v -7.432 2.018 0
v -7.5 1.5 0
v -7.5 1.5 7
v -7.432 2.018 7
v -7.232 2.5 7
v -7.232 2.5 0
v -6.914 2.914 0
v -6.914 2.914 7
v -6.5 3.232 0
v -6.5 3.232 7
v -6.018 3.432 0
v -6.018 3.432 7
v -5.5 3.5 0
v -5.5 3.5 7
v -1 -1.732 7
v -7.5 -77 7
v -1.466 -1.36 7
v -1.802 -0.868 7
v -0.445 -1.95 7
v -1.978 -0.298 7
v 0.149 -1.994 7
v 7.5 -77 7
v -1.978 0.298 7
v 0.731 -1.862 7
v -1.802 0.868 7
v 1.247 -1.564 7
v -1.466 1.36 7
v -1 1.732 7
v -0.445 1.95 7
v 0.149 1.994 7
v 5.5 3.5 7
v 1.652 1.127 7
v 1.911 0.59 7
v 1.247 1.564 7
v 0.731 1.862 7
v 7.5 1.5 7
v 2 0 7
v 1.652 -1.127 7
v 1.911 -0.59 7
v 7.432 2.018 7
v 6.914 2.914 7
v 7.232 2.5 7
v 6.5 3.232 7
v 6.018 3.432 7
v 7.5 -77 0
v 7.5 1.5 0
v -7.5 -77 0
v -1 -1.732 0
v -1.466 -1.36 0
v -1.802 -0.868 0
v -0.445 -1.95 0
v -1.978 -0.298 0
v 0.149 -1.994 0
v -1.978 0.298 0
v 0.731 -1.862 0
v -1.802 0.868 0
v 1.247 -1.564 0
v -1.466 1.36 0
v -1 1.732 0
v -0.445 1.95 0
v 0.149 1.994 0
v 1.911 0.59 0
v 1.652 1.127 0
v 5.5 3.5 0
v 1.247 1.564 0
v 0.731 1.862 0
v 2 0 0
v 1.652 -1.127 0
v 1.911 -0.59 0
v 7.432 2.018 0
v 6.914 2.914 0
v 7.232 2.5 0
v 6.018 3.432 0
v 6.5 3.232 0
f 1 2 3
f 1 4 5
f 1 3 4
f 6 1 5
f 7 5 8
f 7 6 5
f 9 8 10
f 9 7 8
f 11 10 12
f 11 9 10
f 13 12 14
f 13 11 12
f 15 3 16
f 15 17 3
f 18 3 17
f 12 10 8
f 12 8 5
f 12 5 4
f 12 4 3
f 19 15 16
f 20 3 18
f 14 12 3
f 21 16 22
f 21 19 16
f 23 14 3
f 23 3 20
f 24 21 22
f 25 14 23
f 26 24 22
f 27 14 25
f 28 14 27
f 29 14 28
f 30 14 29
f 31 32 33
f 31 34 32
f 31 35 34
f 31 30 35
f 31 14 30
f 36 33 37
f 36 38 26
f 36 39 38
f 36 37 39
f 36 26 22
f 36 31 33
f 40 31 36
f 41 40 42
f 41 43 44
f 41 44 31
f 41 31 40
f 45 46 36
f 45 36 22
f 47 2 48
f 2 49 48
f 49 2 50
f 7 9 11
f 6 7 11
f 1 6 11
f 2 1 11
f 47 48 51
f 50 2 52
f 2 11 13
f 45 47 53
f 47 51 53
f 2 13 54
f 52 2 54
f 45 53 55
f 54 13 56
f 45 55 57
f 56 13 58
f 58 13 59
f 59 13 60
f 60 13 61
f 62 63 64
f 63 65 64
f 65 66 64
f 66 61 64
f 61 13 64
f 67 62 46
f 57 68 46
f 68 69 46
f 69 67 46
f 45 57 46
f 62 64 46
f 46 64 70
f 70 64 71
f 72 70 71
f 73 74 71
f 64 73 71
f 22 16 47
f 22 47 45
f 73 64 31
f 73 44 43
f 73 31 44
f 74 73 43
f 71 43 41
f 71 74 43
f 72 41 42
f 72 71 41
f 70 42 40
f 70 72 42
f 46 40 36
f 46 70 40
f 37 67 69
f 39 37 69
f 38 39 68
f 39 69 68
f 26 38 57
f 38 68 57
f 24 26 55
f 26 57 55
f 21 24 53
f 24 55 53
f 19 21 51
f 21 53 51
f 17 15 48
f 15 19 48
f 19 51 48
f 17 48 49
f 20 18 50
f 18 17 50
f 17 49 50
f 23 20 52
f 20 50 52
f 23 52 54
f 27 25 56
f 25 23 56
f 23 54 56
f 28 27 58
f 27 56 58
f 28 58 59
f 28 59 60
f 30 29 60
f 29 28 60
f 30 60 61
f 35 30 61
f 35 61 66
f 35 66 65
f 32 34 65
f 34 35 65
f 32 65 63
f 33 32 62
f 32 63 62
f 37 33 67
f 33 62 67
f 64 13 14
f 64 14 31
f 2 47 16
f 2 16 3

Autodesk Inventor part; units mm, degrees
ref_plane "YZ Plane" through (0, 0, 0) normal (1, 0, 0) x (0, 1, 0)
ref_plane "XZ Plane" through (0, 0, 0) normal (0, 1, 0) x (-1, 0, 0)
ref_plane "XY Plane" through (0, 0, 0) normal (0, 0, 1) x (1, 0, 0)
sketch "Sketch1" plane through (0, 0, 0) normal (0, 0, 1) x (1, 0, 0)
  circle A0 centre (0, 0) radius 2
  line L0 (-5.5, 3.5) -> (5.5, 3.5)
  line L1 (7.5, 1.5) -> (7.5, -3.5)
  line L2 (7.5, -3.5) -> (-7.5, -3.5)
  line L3 (-7.5, -3.5) -> (-7.5, 1.5)
  arc A1 (-5.5, 3.5) -> (-7.5, 1.5) centre (-5.5, 1.5) ccw
  arc A2 (7.5, 1.5) -> (5.5, 3.5) centre (5.5, 1.5) ccw
  point P0 (7.5, 3.5)
  dimension "d0" = 4
  dimension "d1" = 15
  dimension "d2" = 7
  dimension "d3" = 7.5
  dimension "d4" = 3.5
  dimension "d5" = 2
extrude "Extrusion1" add sketch "Sketch1" along normal blind 7
sketch "Sketch2" plane through (-7.5, -3.5, 0) normal (0, -1, 0) x (1, 0, 0)
  line L0 (15, 0) -> (13, 0) projected
  line L1 (0, 7) -> (15, 7)
  line L2 (15, 7) -> (15, 0)
  line L3 (15, 0) -> (0, 0)
  line L4 (0, 0) -> (0, 7)
  line L5 (0, 7) -> (15, 7) projected
  line L6 (0, 0) -> (0, 7) projected
  point P0 (7.5, 0)
  dimension "d8" = 0
  dimension "d9" = 0
extrude "Extrusion2" add sketch "Sketch2" along normal blind 73.5
properties part number "backside arm"
